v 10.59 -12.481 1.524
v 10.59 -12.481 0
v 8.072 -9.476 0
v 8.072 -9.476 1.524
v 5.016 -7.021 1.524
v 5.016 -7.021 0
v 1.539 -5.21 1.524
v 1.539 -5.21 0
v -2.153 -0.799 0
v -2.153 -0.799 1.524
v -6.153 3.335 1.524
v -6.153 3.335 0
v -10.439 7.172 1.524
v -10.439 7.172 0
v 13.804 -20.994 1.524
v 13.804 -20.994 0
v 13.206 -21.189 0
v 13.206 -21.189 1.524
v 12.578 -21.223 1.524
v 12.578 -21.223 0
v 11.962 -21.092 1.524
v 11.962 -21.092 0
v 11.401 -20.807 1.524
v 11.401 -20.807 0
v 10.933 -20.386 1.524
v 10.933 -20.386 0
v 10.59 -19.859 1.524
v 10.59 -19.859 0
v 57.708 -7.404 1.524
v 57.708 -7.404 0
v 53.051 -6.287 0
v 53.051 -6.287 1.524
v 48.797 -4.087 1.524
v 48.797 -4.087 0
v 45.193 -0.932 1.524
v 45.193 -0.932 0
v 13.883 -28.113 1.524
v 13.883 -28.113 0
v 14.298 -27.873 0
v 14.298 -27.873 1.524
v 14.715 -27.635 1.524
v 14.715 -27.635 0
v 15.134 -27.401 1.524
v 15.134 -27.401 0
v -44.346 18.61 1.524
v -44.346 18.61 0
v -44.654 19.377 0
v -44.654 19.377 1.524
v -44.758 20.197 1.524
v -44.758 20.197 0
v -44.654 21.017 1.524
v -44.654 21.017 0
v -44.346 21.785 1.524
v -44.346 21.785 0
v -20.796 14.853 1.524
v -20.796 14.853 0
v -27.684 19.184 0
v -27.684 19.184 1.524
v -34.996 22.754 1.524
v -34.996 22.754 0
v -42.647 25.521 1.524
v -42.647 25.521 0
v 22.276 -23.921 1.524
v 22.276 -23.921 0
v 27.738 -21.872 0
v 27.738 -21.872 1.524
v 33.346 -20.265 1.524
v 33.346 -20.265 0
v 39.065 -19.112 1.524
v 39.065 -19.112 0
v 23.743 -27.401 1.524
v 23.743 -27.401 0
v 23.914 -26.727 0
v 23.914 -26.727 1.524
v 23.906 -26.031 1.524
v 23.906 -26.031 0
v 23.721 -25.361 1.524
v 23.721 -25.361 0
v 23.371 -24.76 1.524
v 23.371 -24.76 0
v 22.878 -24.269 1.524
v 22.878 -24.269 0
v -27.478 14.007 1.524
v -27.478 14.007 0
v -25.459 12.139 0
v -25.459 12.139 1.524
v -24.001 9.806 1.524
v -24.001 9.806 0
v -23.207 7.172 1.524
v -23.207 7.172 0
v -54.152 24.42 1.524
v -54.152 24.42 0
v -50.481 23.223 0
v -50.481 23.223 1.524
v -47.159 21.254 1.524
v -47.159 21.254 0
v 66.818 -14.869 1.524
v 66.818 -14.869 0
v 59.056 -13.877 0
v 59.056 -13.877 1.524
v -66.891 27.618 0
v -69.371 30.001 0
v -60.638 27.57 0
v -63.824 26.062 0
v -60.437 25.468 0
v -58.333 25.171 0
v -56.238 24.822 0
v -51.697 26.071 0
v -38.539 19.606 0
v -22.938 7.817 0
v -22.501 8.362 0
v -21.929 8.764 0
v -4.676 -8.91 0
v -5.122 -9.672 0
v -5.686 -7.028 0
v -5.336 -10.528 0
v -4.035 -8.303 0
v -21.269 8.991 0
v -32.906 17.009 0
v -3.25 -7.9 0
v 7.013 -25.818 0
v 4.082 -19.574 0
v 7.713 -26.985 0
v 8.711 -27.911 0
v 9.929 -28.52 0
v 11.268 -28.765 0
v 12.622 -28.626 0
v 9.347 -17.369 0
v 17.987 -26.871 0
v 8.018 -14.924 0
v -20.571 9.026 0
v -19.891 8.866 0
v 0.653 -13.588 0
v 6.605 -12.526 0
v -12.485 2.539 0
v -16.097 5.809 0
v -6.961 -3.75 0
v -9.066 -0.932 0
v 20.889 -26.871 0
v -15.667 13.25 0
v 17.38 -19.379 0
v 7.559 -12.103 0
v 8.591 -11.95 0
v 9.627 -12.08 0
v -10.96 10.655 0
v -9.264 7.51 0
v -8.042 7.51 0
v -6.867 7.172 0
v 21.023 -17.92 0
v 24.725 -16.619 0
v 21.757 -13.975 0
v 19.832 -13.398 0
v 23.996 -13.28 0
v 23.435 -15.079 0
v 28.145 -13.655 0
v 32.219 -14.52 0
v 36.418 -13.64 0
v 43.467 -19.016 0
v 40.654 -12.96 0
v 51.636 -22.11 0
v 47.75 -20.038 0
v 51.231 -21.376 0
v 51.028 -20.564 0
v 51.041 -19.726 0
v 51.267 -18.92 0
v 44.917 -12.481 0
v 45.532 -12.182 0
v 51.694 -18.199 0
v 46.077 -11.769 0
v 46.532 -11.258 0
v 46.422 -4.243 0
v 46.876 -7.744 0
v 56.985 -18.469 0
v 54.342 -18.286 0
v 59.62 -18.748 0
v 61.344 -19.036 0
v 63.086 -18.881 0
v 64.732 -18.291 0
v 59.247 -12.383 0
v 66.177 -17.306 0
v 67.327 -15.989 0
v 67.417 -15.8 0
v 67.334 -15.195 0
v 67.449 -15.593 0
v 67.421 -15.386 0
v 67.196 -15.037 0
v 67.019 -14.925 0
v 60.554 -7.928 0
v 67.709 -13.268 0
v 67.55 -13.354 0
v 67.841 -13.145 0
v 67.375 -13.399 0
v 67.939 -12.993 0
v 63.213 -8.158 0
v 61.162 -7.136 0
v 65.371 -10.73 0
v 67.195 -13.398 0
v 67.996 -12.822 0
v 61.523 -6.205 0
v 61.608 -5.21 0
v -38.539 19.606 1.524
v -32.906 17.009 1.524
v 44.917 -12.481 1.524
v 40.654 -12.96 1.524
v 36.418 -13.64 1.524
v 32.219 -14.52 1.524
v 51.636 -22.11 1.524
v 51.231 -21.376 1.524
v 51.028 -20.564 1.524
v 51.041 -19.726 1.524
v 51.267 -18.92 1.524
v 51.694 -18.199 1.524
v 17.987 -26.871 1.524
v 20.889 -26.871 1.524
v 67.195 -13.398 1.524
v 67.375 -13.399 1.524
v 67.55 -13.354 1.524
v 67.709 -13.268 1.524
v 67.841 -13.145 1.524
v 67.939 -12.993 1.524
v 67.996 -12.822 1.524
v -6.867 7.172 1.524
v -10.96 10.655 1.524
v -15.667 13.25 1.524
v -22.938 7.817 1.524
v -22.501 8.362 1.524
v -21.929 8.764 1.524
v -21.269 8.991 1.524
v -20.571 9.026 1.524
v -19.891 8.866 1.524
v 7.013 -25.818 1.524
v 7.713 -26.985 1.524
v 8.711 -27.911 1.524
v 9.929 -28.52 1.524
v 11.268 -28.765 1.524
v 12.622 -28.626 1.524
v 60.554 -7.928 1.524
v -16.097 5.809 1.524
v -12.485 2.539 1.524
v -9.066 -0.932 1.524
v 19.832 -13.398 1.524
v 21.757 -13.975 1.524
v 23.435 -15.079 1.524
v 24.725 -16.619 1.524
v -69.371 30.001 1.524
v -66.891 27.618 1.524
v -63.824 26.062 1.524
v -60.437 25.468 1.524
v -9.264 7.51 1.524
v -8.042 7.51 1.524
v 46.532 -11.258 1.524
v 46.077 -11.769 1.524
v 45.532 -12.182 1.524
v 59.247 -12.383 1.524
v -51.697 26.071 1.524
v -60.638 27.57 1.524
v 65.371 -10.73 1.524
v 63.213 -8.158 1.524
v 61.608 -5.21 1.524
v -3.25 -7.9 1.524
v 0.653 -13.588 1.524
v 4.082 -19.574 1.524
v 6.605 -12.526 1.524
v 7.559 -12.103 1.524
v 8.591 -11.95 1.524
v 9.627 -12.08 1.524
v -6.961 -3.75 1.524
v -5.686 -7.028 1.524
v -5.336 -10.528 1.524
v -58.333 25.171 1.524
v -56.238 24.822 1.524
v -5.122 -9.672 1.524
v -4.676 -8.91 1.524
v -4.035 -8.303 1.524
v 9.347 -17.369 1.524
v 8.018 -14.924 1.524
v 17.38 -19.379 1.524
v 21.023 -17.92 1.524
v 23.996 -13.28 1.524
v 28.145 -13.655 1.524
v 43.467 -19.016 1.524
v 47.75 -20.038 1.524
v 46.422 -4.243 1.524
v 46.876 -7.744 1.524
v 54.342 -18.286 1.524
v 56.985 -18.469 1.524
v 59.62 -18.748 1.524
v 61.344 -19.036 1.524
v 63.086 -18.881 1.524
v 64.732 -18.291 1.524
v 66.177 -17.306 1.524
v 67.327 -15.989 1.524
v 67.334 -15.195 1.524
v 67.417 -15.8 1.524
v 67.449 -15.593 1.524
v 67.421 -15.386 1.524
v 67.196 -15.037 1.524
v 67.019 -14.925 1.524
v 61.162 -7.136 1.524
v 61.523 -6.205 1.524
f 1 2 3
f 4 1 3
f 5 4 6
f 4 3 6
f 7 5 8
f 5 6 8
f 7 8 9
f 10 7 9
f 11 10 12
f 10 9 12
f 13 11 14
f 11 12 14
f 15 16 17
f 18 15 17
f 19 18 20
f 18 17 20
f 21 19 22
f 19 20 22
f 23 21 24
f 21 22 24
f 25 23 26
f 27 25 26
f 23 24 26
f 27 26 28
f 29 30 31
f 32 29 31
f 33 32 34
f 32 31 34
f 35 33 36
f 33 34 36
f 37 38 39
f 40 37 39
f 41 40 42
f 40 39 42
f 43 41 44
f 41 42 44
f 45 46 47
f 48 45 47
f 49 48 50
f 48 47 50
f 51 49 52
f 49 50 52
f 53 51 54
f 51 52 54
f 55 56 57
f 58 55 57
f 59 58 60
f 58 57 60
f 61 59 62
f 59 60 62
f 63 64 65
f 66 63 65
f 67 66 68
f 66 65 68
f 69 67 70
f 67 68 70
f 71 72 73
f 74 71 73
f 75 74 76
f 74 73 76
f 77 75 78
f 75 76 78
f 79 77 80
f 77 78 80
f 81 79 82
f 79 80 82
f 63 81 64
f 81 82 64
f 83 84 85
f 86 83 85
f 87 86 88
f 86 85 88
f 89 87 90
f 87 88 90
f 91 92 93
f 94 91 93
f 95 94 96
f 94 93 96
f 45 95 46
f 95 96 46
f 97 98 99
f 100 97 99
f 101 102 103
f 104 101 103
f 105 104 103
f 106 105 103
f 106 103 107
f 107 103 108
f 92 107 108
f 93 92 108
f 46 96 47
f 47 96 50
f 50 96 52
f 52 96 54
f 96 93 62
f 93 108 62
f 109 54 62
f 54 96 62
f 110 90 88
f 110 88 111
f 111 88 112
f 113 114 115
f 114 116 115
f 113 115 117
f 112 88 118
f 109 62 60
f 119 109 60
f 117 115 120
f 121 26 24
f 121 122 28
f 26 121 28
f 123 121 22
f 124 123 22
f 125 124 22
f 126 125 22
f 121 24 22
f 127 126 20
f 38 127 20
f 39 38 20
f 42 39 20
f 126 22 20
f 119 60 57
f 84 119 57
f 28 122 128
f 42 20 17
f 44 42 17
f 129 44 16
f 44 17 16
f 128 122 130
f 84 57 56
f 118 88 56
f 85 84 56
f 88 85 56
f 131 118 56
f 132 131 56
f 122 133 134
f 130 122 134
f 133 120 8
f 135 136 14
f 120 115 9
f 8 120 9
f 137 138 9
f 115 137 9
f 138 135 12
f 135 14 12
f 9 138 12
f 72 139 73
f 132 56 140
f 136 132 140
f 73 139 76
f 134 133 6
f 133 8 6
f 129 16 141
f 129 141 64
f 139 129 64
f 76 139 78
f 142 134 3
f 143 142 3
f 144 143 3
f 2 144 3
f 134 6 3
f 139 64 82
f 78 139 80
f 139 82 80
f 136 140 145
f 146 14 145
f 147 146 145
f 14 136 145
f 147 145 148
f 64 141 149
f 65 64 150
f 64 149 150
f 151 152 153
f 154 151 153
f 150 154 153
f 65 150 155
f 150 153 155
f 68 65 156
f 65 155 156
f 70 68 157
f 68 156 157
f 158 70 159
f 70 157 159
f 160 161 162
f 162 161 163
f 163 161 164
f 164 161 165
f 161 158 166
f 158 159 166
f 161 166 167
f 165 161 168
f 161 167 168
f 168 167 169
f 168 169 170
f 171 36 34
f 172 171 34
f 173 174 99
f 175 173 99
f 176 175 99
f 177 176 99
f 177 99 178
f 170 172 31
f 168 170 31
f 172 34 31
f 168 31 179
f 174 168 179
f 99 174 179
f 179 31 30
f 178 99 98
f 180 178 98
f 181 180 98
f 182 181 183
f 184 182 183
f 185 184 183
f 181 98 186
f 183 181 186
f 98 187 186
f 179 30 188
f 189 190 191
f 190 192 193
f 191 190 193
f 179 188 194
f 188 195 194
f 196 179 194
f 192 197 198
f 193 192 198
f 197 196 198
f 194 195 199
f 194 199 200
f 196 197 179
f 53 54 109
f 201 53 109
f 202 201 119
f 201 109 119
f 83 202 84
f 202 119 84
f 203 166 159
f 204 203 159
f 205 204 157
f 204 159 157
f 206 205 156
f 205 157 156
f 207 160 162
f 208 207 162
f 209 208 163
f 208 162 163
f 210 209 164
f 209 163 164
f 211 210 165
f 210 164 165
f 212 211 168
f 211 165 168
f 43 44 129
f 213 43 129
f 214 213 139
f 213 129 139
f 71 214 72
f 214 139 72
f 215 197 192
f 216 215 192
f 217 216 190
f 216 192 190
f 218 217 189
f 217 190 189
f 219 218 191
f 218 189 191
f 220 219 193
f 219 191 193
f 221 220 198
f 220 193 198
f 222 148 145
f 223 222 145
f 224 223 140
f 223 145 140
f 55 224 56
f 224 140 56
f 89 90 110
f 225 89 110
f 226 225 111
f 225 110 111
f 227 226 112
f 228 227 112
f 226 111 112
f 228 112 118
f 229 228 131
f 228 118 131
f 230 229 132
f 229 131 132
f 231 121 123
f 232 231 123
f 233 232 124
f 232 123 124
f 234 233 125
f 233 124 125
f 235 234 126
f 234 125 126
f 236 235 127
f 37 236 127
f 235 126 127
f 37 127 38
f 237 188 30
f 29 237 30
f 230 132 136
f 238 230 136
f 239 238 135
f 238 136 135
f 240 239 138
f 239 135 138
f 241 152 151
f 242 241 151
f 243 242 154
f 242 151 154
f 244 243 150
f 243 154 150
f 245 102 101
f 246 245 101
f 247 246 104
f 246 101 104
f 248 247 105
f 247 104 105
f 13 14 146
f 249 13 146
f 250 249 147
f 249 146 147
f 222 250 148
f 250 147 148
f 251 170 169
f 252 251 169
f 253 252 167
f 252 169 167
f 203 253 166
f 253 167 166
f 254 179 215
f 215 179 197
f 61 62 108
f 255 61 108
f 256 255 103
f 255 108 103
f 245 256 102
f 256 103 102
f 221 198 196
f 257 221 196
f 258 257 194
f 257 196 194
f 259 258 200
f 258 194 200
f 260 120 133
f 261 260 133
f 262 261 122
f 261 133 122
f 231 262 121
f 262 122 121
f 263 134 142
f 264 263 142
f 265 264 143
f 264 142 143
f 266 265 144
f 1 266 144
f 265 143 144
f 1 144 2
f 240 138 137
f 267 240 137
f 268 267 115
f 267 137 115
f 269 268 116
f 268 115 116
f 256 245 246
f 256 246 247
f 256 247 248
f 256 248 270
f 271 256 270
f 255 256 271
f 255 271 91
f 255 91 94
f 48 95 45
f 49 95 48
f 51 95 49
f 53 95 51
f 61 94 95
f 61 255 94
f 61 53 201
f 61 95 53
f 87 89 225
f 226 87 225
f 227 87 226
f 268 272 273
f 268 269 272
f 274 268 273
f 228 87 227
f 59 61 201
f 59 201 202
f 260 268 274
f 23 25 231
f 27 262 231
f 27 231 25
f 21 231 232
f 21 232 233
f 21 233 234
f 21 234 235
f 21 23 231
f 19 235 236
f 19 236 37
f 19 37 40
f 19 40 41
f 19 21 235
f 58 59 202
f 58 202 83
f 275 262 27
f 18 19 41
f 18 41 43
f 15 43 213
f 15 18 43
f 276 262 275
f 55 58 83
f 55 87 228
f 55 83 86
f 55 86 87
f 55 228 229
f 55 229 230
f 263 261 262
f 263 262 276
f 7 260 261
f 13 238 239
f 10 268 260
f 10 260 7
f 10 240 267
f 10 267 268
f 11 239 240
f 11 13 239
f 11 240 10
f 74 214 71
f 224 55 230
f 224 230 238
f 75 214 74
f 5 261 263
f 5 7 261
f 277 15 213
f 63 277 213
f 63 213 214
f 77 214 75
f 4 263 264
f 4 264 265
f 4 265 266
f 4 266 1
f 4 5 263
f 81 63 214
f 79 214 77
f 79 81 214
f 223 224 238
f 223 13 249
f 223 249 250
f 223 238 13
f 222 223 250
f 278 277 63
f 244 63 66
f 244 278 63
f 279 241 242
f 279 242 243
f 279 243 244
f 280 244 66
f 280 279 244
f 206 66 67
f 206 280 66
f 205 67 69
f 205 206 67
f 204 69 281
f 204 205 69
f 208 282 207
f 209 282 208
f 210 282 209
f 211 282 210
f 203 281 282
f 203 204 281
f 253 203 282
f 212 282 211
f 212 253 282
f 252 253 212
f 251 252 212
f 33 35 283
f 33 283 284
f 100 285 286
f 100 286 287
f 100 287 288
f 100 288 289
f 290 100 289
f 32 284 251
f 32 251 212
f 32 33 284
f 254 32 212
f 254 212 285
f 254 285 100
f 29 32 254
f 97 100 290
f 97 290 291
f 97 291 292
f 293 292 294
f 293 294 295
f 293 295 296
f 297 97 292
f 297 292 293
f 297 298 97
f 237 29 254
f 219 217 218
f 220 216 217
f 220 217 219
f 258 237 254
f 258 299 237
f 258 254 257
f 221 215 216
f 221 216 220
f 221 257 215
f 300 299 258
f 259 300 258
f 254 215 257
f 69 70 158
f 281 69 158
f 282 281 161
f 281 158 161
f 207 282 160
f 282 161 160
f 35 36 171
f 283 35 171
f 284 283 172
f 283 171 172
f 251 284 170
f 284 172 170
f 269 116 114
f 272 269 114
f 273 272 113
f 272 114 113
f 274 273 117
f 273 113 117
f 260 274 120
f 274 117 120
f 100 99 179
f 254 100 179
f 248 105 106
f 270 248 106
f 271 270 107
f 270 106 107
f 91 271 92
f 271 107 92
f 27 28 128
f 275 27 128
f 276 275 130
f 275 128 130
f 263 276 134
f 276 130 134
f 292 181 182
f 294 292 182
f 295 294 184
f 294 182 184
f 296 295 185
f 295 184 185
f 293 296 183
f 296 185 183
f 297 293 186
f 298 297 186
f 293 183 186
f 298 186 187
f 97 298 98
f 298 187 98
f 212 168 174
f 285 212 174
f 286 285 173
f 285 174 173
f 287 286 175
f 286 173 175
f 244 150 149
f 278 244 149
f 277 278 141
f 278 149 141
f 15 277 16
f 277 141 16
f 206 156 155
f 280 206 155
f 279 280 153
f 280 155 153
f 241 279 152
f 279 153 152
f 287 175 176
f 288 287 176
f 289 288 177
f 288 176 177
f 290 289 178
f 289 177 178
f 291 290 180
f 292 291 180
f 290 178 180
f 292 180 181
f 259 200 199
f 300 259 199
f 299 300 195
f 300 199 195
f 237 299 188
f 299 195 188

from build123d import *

# Parameters (mm, degrees)
BOSS_EXTRUDE1_DEPTH = 1.524


with BuildPart() as part:
    # Sketch1 → Boss-Extrude1 (new body)
    with BuildSketch(Plane.XY):
        with BuildLine():
            Line((66.817686168, -14.869164569), (59.056150877, -13.876858964))
            Line((59.056150877, -13.876858964), (59.247042617, -12.382986483))
            Line((59.247042617, -12.382986483), (67.194822679, -13.398359477))
            ThreePointArc((67.194822679, -13.398359477), (67.70899541, -13.26788211), (67.995751093, -12.821598434))
            ThreePointArc((67.995751093, -12.821598434), (64.227291304, -9.497799736), (61.607555958, -5.209919876))
            ThreePointArc((61.607555958, -5.209919876), (61.375328576, -6.683073901), (60.554429435, -7.928159013))
            Line((60.554429435, -7.928159013), (57.70805725, -7.403828432))
            ThreePointArc((57.70805725, -7.403828432), (50.857364323, -5.31551987), (45.193330731, -0.93239887))
            ThreePointArc((45.193330731, -0.93239887), (46.74856309, -5.980463476), (46.532138914, -11.258234267))
            ThreePointArc((46.532138914, -11.258234267), (45.814421681, -11.988335606), (44.917143983, -12.481345467))
            ThreePointArc((44.917143983, -12.481345467), (38.532037538, -13.275274102), (32.219333695, -14.520134408))
            ThreePointArc((32.219333695, -14.520134408), (26.075931145, -13.405705196), (19.832270887, -13.398359477))
            ThreePointArc((19.832270887, -13.398359477), (22.636275156, -14.465946733), (24.725407976, -16.619480236))
            ThreePointArc((24.725407976, -16.619480236), (19.193818209, -18.629561925), (13.804325827, -20.994363314))
            ThreePointArc((13.804325827, -20.994363314), (11.961969019, -21.092468706), (10.589989147, -19.858947525))
            ThreePointArc((10.589989147, -19.858947525), (8.692873036, -16.140740523), (6.604648633, -12.52640356))
            ThreePointArc((6.604648633, -12.52640356), (8.591060293, -11.950308262), (10.589989147, -12.481345467))
            ThreePointArc((10.589989147, -12.481345467), (6.604648633, -8.173624539), (1.539487899, -5.209919876))
            ThreePointArc((1.539487899, -5.209919876), (-4.115983201, 1.303955497), (-10.439102907, 7.171926434))
            ThreePointArc((-10.439102907, 7.171926434), (-8.653197321, 7.552707081), (-6.867291735, 7.171926434))
            ThreePointArc((-6.867291735, 7.171926434), (-13.248231641, 12.071035928), (-20.796462113, 14.853460169))
            ThreePointArc((-20.796462113, 14.853460169), (-31.29237864, 21.067135925), (-42.647396117, 25.521078925))
            ThreePointArc((-42.647396117, 25.521078925), (-56.186845853, 26.702409902), (-69.371487811, 30.000509128))
            ThreePointArc((-69.371487811, 30.000509128), (-65.415318989, 26.726735017), (-60.436877471, 25.468168876))
            ThreePointArc((-60.436877471, 25.468168876), (-57.284615578, 25.003207948), (-54.152019191, 24.420298363))
            ThreePointArc((-54.152019191, 24.420298363), (-48.766215804, 22.329910268), (-44.346090572, 18.609817064))
            ThreePointArc((-44.346090572, 18.609817064), (-44.75848849, 20.197264615), (-44.346090572, 21.784712166))
            ThreePointArc((-44.346090572, 21.784712166), (-35.698486655, 18.358779729), (-27.477516693, 14.007490327))
            ThreePointArc((-27.477516693, 14.007490327), (-24.652349792, 11.020731115), (-23.207012071, 7.171926434))
            ThreePointArc((-23.207012071, 7.171926434), (-21.929330632, 8.763840822), (-19.890640696, 8.865843888))
            ThreePointArc((-19.890640696, 8.865843888), (-14.26749676, 4.199817582), (-9.066352318, -0.93239887))
            ThreePointArc((-9.066352318, -0.93239887), (-6.212207546, -5.345518339), (-5.336411329, -10.527674919))
            ThreePointArc((-5.336411329, -10.527674919), (-4.676038807, -8.910060646), (-3.250173943, -7.900269978))
            ThreePointArc((-3.250173943, -7.900269978), (2.428109507, -16.545845472), (7.012996253, -25.817721879))
            ThreePointArc((7.012996253, -25.817721879), (9.928518411, -28.520179408), (13.883000235, -28.113215463))
            ThreePointArc((13.883000235, -28.113215463), (14.506734037, -27.753899557), (15.133981782, -27.400753634))
            ThreePointArc((15.133981782, -27.400753634), (19.438401061, -26.804711741), (23.74282034, -27.400753634))
            ThreePointArc((23.74282034, -27.400753634), (23.721132898, -25.36083225), (22.275997143, -23.920925222))
            ThreePointArc((22.275997143, -23.920925222), (30.525936774, -21.012373591), (39.064631831, -19.111883331))
            ThreePointArc((39.064631831, -19.111883331), (45.641469135, -19.389960489), (51.636059466, -22.1097036))
            ThreePointArc((51.636059466, -22.1097036), (51.007316283, -20.144641068), (51.693543332, -18.19890697))
            ThreePointArc((51.693543332, -18.19890697), (55.664100075, -18.365490547), (59.619700642, -18.74797596))
            ThreePointArc((59.619700642, -18.74797596), (63.927856855, -18.638412611), (67.326700796, -15.988870395))
            ThreePointArc((67.326700796, -15.988870395), (67.384238378, -15.287162887), (66.817686168, -14.869164569))
        make_face()
    extrude(amount=BOSS_EXTRUDE1_DEPTH)


solid = part.part
